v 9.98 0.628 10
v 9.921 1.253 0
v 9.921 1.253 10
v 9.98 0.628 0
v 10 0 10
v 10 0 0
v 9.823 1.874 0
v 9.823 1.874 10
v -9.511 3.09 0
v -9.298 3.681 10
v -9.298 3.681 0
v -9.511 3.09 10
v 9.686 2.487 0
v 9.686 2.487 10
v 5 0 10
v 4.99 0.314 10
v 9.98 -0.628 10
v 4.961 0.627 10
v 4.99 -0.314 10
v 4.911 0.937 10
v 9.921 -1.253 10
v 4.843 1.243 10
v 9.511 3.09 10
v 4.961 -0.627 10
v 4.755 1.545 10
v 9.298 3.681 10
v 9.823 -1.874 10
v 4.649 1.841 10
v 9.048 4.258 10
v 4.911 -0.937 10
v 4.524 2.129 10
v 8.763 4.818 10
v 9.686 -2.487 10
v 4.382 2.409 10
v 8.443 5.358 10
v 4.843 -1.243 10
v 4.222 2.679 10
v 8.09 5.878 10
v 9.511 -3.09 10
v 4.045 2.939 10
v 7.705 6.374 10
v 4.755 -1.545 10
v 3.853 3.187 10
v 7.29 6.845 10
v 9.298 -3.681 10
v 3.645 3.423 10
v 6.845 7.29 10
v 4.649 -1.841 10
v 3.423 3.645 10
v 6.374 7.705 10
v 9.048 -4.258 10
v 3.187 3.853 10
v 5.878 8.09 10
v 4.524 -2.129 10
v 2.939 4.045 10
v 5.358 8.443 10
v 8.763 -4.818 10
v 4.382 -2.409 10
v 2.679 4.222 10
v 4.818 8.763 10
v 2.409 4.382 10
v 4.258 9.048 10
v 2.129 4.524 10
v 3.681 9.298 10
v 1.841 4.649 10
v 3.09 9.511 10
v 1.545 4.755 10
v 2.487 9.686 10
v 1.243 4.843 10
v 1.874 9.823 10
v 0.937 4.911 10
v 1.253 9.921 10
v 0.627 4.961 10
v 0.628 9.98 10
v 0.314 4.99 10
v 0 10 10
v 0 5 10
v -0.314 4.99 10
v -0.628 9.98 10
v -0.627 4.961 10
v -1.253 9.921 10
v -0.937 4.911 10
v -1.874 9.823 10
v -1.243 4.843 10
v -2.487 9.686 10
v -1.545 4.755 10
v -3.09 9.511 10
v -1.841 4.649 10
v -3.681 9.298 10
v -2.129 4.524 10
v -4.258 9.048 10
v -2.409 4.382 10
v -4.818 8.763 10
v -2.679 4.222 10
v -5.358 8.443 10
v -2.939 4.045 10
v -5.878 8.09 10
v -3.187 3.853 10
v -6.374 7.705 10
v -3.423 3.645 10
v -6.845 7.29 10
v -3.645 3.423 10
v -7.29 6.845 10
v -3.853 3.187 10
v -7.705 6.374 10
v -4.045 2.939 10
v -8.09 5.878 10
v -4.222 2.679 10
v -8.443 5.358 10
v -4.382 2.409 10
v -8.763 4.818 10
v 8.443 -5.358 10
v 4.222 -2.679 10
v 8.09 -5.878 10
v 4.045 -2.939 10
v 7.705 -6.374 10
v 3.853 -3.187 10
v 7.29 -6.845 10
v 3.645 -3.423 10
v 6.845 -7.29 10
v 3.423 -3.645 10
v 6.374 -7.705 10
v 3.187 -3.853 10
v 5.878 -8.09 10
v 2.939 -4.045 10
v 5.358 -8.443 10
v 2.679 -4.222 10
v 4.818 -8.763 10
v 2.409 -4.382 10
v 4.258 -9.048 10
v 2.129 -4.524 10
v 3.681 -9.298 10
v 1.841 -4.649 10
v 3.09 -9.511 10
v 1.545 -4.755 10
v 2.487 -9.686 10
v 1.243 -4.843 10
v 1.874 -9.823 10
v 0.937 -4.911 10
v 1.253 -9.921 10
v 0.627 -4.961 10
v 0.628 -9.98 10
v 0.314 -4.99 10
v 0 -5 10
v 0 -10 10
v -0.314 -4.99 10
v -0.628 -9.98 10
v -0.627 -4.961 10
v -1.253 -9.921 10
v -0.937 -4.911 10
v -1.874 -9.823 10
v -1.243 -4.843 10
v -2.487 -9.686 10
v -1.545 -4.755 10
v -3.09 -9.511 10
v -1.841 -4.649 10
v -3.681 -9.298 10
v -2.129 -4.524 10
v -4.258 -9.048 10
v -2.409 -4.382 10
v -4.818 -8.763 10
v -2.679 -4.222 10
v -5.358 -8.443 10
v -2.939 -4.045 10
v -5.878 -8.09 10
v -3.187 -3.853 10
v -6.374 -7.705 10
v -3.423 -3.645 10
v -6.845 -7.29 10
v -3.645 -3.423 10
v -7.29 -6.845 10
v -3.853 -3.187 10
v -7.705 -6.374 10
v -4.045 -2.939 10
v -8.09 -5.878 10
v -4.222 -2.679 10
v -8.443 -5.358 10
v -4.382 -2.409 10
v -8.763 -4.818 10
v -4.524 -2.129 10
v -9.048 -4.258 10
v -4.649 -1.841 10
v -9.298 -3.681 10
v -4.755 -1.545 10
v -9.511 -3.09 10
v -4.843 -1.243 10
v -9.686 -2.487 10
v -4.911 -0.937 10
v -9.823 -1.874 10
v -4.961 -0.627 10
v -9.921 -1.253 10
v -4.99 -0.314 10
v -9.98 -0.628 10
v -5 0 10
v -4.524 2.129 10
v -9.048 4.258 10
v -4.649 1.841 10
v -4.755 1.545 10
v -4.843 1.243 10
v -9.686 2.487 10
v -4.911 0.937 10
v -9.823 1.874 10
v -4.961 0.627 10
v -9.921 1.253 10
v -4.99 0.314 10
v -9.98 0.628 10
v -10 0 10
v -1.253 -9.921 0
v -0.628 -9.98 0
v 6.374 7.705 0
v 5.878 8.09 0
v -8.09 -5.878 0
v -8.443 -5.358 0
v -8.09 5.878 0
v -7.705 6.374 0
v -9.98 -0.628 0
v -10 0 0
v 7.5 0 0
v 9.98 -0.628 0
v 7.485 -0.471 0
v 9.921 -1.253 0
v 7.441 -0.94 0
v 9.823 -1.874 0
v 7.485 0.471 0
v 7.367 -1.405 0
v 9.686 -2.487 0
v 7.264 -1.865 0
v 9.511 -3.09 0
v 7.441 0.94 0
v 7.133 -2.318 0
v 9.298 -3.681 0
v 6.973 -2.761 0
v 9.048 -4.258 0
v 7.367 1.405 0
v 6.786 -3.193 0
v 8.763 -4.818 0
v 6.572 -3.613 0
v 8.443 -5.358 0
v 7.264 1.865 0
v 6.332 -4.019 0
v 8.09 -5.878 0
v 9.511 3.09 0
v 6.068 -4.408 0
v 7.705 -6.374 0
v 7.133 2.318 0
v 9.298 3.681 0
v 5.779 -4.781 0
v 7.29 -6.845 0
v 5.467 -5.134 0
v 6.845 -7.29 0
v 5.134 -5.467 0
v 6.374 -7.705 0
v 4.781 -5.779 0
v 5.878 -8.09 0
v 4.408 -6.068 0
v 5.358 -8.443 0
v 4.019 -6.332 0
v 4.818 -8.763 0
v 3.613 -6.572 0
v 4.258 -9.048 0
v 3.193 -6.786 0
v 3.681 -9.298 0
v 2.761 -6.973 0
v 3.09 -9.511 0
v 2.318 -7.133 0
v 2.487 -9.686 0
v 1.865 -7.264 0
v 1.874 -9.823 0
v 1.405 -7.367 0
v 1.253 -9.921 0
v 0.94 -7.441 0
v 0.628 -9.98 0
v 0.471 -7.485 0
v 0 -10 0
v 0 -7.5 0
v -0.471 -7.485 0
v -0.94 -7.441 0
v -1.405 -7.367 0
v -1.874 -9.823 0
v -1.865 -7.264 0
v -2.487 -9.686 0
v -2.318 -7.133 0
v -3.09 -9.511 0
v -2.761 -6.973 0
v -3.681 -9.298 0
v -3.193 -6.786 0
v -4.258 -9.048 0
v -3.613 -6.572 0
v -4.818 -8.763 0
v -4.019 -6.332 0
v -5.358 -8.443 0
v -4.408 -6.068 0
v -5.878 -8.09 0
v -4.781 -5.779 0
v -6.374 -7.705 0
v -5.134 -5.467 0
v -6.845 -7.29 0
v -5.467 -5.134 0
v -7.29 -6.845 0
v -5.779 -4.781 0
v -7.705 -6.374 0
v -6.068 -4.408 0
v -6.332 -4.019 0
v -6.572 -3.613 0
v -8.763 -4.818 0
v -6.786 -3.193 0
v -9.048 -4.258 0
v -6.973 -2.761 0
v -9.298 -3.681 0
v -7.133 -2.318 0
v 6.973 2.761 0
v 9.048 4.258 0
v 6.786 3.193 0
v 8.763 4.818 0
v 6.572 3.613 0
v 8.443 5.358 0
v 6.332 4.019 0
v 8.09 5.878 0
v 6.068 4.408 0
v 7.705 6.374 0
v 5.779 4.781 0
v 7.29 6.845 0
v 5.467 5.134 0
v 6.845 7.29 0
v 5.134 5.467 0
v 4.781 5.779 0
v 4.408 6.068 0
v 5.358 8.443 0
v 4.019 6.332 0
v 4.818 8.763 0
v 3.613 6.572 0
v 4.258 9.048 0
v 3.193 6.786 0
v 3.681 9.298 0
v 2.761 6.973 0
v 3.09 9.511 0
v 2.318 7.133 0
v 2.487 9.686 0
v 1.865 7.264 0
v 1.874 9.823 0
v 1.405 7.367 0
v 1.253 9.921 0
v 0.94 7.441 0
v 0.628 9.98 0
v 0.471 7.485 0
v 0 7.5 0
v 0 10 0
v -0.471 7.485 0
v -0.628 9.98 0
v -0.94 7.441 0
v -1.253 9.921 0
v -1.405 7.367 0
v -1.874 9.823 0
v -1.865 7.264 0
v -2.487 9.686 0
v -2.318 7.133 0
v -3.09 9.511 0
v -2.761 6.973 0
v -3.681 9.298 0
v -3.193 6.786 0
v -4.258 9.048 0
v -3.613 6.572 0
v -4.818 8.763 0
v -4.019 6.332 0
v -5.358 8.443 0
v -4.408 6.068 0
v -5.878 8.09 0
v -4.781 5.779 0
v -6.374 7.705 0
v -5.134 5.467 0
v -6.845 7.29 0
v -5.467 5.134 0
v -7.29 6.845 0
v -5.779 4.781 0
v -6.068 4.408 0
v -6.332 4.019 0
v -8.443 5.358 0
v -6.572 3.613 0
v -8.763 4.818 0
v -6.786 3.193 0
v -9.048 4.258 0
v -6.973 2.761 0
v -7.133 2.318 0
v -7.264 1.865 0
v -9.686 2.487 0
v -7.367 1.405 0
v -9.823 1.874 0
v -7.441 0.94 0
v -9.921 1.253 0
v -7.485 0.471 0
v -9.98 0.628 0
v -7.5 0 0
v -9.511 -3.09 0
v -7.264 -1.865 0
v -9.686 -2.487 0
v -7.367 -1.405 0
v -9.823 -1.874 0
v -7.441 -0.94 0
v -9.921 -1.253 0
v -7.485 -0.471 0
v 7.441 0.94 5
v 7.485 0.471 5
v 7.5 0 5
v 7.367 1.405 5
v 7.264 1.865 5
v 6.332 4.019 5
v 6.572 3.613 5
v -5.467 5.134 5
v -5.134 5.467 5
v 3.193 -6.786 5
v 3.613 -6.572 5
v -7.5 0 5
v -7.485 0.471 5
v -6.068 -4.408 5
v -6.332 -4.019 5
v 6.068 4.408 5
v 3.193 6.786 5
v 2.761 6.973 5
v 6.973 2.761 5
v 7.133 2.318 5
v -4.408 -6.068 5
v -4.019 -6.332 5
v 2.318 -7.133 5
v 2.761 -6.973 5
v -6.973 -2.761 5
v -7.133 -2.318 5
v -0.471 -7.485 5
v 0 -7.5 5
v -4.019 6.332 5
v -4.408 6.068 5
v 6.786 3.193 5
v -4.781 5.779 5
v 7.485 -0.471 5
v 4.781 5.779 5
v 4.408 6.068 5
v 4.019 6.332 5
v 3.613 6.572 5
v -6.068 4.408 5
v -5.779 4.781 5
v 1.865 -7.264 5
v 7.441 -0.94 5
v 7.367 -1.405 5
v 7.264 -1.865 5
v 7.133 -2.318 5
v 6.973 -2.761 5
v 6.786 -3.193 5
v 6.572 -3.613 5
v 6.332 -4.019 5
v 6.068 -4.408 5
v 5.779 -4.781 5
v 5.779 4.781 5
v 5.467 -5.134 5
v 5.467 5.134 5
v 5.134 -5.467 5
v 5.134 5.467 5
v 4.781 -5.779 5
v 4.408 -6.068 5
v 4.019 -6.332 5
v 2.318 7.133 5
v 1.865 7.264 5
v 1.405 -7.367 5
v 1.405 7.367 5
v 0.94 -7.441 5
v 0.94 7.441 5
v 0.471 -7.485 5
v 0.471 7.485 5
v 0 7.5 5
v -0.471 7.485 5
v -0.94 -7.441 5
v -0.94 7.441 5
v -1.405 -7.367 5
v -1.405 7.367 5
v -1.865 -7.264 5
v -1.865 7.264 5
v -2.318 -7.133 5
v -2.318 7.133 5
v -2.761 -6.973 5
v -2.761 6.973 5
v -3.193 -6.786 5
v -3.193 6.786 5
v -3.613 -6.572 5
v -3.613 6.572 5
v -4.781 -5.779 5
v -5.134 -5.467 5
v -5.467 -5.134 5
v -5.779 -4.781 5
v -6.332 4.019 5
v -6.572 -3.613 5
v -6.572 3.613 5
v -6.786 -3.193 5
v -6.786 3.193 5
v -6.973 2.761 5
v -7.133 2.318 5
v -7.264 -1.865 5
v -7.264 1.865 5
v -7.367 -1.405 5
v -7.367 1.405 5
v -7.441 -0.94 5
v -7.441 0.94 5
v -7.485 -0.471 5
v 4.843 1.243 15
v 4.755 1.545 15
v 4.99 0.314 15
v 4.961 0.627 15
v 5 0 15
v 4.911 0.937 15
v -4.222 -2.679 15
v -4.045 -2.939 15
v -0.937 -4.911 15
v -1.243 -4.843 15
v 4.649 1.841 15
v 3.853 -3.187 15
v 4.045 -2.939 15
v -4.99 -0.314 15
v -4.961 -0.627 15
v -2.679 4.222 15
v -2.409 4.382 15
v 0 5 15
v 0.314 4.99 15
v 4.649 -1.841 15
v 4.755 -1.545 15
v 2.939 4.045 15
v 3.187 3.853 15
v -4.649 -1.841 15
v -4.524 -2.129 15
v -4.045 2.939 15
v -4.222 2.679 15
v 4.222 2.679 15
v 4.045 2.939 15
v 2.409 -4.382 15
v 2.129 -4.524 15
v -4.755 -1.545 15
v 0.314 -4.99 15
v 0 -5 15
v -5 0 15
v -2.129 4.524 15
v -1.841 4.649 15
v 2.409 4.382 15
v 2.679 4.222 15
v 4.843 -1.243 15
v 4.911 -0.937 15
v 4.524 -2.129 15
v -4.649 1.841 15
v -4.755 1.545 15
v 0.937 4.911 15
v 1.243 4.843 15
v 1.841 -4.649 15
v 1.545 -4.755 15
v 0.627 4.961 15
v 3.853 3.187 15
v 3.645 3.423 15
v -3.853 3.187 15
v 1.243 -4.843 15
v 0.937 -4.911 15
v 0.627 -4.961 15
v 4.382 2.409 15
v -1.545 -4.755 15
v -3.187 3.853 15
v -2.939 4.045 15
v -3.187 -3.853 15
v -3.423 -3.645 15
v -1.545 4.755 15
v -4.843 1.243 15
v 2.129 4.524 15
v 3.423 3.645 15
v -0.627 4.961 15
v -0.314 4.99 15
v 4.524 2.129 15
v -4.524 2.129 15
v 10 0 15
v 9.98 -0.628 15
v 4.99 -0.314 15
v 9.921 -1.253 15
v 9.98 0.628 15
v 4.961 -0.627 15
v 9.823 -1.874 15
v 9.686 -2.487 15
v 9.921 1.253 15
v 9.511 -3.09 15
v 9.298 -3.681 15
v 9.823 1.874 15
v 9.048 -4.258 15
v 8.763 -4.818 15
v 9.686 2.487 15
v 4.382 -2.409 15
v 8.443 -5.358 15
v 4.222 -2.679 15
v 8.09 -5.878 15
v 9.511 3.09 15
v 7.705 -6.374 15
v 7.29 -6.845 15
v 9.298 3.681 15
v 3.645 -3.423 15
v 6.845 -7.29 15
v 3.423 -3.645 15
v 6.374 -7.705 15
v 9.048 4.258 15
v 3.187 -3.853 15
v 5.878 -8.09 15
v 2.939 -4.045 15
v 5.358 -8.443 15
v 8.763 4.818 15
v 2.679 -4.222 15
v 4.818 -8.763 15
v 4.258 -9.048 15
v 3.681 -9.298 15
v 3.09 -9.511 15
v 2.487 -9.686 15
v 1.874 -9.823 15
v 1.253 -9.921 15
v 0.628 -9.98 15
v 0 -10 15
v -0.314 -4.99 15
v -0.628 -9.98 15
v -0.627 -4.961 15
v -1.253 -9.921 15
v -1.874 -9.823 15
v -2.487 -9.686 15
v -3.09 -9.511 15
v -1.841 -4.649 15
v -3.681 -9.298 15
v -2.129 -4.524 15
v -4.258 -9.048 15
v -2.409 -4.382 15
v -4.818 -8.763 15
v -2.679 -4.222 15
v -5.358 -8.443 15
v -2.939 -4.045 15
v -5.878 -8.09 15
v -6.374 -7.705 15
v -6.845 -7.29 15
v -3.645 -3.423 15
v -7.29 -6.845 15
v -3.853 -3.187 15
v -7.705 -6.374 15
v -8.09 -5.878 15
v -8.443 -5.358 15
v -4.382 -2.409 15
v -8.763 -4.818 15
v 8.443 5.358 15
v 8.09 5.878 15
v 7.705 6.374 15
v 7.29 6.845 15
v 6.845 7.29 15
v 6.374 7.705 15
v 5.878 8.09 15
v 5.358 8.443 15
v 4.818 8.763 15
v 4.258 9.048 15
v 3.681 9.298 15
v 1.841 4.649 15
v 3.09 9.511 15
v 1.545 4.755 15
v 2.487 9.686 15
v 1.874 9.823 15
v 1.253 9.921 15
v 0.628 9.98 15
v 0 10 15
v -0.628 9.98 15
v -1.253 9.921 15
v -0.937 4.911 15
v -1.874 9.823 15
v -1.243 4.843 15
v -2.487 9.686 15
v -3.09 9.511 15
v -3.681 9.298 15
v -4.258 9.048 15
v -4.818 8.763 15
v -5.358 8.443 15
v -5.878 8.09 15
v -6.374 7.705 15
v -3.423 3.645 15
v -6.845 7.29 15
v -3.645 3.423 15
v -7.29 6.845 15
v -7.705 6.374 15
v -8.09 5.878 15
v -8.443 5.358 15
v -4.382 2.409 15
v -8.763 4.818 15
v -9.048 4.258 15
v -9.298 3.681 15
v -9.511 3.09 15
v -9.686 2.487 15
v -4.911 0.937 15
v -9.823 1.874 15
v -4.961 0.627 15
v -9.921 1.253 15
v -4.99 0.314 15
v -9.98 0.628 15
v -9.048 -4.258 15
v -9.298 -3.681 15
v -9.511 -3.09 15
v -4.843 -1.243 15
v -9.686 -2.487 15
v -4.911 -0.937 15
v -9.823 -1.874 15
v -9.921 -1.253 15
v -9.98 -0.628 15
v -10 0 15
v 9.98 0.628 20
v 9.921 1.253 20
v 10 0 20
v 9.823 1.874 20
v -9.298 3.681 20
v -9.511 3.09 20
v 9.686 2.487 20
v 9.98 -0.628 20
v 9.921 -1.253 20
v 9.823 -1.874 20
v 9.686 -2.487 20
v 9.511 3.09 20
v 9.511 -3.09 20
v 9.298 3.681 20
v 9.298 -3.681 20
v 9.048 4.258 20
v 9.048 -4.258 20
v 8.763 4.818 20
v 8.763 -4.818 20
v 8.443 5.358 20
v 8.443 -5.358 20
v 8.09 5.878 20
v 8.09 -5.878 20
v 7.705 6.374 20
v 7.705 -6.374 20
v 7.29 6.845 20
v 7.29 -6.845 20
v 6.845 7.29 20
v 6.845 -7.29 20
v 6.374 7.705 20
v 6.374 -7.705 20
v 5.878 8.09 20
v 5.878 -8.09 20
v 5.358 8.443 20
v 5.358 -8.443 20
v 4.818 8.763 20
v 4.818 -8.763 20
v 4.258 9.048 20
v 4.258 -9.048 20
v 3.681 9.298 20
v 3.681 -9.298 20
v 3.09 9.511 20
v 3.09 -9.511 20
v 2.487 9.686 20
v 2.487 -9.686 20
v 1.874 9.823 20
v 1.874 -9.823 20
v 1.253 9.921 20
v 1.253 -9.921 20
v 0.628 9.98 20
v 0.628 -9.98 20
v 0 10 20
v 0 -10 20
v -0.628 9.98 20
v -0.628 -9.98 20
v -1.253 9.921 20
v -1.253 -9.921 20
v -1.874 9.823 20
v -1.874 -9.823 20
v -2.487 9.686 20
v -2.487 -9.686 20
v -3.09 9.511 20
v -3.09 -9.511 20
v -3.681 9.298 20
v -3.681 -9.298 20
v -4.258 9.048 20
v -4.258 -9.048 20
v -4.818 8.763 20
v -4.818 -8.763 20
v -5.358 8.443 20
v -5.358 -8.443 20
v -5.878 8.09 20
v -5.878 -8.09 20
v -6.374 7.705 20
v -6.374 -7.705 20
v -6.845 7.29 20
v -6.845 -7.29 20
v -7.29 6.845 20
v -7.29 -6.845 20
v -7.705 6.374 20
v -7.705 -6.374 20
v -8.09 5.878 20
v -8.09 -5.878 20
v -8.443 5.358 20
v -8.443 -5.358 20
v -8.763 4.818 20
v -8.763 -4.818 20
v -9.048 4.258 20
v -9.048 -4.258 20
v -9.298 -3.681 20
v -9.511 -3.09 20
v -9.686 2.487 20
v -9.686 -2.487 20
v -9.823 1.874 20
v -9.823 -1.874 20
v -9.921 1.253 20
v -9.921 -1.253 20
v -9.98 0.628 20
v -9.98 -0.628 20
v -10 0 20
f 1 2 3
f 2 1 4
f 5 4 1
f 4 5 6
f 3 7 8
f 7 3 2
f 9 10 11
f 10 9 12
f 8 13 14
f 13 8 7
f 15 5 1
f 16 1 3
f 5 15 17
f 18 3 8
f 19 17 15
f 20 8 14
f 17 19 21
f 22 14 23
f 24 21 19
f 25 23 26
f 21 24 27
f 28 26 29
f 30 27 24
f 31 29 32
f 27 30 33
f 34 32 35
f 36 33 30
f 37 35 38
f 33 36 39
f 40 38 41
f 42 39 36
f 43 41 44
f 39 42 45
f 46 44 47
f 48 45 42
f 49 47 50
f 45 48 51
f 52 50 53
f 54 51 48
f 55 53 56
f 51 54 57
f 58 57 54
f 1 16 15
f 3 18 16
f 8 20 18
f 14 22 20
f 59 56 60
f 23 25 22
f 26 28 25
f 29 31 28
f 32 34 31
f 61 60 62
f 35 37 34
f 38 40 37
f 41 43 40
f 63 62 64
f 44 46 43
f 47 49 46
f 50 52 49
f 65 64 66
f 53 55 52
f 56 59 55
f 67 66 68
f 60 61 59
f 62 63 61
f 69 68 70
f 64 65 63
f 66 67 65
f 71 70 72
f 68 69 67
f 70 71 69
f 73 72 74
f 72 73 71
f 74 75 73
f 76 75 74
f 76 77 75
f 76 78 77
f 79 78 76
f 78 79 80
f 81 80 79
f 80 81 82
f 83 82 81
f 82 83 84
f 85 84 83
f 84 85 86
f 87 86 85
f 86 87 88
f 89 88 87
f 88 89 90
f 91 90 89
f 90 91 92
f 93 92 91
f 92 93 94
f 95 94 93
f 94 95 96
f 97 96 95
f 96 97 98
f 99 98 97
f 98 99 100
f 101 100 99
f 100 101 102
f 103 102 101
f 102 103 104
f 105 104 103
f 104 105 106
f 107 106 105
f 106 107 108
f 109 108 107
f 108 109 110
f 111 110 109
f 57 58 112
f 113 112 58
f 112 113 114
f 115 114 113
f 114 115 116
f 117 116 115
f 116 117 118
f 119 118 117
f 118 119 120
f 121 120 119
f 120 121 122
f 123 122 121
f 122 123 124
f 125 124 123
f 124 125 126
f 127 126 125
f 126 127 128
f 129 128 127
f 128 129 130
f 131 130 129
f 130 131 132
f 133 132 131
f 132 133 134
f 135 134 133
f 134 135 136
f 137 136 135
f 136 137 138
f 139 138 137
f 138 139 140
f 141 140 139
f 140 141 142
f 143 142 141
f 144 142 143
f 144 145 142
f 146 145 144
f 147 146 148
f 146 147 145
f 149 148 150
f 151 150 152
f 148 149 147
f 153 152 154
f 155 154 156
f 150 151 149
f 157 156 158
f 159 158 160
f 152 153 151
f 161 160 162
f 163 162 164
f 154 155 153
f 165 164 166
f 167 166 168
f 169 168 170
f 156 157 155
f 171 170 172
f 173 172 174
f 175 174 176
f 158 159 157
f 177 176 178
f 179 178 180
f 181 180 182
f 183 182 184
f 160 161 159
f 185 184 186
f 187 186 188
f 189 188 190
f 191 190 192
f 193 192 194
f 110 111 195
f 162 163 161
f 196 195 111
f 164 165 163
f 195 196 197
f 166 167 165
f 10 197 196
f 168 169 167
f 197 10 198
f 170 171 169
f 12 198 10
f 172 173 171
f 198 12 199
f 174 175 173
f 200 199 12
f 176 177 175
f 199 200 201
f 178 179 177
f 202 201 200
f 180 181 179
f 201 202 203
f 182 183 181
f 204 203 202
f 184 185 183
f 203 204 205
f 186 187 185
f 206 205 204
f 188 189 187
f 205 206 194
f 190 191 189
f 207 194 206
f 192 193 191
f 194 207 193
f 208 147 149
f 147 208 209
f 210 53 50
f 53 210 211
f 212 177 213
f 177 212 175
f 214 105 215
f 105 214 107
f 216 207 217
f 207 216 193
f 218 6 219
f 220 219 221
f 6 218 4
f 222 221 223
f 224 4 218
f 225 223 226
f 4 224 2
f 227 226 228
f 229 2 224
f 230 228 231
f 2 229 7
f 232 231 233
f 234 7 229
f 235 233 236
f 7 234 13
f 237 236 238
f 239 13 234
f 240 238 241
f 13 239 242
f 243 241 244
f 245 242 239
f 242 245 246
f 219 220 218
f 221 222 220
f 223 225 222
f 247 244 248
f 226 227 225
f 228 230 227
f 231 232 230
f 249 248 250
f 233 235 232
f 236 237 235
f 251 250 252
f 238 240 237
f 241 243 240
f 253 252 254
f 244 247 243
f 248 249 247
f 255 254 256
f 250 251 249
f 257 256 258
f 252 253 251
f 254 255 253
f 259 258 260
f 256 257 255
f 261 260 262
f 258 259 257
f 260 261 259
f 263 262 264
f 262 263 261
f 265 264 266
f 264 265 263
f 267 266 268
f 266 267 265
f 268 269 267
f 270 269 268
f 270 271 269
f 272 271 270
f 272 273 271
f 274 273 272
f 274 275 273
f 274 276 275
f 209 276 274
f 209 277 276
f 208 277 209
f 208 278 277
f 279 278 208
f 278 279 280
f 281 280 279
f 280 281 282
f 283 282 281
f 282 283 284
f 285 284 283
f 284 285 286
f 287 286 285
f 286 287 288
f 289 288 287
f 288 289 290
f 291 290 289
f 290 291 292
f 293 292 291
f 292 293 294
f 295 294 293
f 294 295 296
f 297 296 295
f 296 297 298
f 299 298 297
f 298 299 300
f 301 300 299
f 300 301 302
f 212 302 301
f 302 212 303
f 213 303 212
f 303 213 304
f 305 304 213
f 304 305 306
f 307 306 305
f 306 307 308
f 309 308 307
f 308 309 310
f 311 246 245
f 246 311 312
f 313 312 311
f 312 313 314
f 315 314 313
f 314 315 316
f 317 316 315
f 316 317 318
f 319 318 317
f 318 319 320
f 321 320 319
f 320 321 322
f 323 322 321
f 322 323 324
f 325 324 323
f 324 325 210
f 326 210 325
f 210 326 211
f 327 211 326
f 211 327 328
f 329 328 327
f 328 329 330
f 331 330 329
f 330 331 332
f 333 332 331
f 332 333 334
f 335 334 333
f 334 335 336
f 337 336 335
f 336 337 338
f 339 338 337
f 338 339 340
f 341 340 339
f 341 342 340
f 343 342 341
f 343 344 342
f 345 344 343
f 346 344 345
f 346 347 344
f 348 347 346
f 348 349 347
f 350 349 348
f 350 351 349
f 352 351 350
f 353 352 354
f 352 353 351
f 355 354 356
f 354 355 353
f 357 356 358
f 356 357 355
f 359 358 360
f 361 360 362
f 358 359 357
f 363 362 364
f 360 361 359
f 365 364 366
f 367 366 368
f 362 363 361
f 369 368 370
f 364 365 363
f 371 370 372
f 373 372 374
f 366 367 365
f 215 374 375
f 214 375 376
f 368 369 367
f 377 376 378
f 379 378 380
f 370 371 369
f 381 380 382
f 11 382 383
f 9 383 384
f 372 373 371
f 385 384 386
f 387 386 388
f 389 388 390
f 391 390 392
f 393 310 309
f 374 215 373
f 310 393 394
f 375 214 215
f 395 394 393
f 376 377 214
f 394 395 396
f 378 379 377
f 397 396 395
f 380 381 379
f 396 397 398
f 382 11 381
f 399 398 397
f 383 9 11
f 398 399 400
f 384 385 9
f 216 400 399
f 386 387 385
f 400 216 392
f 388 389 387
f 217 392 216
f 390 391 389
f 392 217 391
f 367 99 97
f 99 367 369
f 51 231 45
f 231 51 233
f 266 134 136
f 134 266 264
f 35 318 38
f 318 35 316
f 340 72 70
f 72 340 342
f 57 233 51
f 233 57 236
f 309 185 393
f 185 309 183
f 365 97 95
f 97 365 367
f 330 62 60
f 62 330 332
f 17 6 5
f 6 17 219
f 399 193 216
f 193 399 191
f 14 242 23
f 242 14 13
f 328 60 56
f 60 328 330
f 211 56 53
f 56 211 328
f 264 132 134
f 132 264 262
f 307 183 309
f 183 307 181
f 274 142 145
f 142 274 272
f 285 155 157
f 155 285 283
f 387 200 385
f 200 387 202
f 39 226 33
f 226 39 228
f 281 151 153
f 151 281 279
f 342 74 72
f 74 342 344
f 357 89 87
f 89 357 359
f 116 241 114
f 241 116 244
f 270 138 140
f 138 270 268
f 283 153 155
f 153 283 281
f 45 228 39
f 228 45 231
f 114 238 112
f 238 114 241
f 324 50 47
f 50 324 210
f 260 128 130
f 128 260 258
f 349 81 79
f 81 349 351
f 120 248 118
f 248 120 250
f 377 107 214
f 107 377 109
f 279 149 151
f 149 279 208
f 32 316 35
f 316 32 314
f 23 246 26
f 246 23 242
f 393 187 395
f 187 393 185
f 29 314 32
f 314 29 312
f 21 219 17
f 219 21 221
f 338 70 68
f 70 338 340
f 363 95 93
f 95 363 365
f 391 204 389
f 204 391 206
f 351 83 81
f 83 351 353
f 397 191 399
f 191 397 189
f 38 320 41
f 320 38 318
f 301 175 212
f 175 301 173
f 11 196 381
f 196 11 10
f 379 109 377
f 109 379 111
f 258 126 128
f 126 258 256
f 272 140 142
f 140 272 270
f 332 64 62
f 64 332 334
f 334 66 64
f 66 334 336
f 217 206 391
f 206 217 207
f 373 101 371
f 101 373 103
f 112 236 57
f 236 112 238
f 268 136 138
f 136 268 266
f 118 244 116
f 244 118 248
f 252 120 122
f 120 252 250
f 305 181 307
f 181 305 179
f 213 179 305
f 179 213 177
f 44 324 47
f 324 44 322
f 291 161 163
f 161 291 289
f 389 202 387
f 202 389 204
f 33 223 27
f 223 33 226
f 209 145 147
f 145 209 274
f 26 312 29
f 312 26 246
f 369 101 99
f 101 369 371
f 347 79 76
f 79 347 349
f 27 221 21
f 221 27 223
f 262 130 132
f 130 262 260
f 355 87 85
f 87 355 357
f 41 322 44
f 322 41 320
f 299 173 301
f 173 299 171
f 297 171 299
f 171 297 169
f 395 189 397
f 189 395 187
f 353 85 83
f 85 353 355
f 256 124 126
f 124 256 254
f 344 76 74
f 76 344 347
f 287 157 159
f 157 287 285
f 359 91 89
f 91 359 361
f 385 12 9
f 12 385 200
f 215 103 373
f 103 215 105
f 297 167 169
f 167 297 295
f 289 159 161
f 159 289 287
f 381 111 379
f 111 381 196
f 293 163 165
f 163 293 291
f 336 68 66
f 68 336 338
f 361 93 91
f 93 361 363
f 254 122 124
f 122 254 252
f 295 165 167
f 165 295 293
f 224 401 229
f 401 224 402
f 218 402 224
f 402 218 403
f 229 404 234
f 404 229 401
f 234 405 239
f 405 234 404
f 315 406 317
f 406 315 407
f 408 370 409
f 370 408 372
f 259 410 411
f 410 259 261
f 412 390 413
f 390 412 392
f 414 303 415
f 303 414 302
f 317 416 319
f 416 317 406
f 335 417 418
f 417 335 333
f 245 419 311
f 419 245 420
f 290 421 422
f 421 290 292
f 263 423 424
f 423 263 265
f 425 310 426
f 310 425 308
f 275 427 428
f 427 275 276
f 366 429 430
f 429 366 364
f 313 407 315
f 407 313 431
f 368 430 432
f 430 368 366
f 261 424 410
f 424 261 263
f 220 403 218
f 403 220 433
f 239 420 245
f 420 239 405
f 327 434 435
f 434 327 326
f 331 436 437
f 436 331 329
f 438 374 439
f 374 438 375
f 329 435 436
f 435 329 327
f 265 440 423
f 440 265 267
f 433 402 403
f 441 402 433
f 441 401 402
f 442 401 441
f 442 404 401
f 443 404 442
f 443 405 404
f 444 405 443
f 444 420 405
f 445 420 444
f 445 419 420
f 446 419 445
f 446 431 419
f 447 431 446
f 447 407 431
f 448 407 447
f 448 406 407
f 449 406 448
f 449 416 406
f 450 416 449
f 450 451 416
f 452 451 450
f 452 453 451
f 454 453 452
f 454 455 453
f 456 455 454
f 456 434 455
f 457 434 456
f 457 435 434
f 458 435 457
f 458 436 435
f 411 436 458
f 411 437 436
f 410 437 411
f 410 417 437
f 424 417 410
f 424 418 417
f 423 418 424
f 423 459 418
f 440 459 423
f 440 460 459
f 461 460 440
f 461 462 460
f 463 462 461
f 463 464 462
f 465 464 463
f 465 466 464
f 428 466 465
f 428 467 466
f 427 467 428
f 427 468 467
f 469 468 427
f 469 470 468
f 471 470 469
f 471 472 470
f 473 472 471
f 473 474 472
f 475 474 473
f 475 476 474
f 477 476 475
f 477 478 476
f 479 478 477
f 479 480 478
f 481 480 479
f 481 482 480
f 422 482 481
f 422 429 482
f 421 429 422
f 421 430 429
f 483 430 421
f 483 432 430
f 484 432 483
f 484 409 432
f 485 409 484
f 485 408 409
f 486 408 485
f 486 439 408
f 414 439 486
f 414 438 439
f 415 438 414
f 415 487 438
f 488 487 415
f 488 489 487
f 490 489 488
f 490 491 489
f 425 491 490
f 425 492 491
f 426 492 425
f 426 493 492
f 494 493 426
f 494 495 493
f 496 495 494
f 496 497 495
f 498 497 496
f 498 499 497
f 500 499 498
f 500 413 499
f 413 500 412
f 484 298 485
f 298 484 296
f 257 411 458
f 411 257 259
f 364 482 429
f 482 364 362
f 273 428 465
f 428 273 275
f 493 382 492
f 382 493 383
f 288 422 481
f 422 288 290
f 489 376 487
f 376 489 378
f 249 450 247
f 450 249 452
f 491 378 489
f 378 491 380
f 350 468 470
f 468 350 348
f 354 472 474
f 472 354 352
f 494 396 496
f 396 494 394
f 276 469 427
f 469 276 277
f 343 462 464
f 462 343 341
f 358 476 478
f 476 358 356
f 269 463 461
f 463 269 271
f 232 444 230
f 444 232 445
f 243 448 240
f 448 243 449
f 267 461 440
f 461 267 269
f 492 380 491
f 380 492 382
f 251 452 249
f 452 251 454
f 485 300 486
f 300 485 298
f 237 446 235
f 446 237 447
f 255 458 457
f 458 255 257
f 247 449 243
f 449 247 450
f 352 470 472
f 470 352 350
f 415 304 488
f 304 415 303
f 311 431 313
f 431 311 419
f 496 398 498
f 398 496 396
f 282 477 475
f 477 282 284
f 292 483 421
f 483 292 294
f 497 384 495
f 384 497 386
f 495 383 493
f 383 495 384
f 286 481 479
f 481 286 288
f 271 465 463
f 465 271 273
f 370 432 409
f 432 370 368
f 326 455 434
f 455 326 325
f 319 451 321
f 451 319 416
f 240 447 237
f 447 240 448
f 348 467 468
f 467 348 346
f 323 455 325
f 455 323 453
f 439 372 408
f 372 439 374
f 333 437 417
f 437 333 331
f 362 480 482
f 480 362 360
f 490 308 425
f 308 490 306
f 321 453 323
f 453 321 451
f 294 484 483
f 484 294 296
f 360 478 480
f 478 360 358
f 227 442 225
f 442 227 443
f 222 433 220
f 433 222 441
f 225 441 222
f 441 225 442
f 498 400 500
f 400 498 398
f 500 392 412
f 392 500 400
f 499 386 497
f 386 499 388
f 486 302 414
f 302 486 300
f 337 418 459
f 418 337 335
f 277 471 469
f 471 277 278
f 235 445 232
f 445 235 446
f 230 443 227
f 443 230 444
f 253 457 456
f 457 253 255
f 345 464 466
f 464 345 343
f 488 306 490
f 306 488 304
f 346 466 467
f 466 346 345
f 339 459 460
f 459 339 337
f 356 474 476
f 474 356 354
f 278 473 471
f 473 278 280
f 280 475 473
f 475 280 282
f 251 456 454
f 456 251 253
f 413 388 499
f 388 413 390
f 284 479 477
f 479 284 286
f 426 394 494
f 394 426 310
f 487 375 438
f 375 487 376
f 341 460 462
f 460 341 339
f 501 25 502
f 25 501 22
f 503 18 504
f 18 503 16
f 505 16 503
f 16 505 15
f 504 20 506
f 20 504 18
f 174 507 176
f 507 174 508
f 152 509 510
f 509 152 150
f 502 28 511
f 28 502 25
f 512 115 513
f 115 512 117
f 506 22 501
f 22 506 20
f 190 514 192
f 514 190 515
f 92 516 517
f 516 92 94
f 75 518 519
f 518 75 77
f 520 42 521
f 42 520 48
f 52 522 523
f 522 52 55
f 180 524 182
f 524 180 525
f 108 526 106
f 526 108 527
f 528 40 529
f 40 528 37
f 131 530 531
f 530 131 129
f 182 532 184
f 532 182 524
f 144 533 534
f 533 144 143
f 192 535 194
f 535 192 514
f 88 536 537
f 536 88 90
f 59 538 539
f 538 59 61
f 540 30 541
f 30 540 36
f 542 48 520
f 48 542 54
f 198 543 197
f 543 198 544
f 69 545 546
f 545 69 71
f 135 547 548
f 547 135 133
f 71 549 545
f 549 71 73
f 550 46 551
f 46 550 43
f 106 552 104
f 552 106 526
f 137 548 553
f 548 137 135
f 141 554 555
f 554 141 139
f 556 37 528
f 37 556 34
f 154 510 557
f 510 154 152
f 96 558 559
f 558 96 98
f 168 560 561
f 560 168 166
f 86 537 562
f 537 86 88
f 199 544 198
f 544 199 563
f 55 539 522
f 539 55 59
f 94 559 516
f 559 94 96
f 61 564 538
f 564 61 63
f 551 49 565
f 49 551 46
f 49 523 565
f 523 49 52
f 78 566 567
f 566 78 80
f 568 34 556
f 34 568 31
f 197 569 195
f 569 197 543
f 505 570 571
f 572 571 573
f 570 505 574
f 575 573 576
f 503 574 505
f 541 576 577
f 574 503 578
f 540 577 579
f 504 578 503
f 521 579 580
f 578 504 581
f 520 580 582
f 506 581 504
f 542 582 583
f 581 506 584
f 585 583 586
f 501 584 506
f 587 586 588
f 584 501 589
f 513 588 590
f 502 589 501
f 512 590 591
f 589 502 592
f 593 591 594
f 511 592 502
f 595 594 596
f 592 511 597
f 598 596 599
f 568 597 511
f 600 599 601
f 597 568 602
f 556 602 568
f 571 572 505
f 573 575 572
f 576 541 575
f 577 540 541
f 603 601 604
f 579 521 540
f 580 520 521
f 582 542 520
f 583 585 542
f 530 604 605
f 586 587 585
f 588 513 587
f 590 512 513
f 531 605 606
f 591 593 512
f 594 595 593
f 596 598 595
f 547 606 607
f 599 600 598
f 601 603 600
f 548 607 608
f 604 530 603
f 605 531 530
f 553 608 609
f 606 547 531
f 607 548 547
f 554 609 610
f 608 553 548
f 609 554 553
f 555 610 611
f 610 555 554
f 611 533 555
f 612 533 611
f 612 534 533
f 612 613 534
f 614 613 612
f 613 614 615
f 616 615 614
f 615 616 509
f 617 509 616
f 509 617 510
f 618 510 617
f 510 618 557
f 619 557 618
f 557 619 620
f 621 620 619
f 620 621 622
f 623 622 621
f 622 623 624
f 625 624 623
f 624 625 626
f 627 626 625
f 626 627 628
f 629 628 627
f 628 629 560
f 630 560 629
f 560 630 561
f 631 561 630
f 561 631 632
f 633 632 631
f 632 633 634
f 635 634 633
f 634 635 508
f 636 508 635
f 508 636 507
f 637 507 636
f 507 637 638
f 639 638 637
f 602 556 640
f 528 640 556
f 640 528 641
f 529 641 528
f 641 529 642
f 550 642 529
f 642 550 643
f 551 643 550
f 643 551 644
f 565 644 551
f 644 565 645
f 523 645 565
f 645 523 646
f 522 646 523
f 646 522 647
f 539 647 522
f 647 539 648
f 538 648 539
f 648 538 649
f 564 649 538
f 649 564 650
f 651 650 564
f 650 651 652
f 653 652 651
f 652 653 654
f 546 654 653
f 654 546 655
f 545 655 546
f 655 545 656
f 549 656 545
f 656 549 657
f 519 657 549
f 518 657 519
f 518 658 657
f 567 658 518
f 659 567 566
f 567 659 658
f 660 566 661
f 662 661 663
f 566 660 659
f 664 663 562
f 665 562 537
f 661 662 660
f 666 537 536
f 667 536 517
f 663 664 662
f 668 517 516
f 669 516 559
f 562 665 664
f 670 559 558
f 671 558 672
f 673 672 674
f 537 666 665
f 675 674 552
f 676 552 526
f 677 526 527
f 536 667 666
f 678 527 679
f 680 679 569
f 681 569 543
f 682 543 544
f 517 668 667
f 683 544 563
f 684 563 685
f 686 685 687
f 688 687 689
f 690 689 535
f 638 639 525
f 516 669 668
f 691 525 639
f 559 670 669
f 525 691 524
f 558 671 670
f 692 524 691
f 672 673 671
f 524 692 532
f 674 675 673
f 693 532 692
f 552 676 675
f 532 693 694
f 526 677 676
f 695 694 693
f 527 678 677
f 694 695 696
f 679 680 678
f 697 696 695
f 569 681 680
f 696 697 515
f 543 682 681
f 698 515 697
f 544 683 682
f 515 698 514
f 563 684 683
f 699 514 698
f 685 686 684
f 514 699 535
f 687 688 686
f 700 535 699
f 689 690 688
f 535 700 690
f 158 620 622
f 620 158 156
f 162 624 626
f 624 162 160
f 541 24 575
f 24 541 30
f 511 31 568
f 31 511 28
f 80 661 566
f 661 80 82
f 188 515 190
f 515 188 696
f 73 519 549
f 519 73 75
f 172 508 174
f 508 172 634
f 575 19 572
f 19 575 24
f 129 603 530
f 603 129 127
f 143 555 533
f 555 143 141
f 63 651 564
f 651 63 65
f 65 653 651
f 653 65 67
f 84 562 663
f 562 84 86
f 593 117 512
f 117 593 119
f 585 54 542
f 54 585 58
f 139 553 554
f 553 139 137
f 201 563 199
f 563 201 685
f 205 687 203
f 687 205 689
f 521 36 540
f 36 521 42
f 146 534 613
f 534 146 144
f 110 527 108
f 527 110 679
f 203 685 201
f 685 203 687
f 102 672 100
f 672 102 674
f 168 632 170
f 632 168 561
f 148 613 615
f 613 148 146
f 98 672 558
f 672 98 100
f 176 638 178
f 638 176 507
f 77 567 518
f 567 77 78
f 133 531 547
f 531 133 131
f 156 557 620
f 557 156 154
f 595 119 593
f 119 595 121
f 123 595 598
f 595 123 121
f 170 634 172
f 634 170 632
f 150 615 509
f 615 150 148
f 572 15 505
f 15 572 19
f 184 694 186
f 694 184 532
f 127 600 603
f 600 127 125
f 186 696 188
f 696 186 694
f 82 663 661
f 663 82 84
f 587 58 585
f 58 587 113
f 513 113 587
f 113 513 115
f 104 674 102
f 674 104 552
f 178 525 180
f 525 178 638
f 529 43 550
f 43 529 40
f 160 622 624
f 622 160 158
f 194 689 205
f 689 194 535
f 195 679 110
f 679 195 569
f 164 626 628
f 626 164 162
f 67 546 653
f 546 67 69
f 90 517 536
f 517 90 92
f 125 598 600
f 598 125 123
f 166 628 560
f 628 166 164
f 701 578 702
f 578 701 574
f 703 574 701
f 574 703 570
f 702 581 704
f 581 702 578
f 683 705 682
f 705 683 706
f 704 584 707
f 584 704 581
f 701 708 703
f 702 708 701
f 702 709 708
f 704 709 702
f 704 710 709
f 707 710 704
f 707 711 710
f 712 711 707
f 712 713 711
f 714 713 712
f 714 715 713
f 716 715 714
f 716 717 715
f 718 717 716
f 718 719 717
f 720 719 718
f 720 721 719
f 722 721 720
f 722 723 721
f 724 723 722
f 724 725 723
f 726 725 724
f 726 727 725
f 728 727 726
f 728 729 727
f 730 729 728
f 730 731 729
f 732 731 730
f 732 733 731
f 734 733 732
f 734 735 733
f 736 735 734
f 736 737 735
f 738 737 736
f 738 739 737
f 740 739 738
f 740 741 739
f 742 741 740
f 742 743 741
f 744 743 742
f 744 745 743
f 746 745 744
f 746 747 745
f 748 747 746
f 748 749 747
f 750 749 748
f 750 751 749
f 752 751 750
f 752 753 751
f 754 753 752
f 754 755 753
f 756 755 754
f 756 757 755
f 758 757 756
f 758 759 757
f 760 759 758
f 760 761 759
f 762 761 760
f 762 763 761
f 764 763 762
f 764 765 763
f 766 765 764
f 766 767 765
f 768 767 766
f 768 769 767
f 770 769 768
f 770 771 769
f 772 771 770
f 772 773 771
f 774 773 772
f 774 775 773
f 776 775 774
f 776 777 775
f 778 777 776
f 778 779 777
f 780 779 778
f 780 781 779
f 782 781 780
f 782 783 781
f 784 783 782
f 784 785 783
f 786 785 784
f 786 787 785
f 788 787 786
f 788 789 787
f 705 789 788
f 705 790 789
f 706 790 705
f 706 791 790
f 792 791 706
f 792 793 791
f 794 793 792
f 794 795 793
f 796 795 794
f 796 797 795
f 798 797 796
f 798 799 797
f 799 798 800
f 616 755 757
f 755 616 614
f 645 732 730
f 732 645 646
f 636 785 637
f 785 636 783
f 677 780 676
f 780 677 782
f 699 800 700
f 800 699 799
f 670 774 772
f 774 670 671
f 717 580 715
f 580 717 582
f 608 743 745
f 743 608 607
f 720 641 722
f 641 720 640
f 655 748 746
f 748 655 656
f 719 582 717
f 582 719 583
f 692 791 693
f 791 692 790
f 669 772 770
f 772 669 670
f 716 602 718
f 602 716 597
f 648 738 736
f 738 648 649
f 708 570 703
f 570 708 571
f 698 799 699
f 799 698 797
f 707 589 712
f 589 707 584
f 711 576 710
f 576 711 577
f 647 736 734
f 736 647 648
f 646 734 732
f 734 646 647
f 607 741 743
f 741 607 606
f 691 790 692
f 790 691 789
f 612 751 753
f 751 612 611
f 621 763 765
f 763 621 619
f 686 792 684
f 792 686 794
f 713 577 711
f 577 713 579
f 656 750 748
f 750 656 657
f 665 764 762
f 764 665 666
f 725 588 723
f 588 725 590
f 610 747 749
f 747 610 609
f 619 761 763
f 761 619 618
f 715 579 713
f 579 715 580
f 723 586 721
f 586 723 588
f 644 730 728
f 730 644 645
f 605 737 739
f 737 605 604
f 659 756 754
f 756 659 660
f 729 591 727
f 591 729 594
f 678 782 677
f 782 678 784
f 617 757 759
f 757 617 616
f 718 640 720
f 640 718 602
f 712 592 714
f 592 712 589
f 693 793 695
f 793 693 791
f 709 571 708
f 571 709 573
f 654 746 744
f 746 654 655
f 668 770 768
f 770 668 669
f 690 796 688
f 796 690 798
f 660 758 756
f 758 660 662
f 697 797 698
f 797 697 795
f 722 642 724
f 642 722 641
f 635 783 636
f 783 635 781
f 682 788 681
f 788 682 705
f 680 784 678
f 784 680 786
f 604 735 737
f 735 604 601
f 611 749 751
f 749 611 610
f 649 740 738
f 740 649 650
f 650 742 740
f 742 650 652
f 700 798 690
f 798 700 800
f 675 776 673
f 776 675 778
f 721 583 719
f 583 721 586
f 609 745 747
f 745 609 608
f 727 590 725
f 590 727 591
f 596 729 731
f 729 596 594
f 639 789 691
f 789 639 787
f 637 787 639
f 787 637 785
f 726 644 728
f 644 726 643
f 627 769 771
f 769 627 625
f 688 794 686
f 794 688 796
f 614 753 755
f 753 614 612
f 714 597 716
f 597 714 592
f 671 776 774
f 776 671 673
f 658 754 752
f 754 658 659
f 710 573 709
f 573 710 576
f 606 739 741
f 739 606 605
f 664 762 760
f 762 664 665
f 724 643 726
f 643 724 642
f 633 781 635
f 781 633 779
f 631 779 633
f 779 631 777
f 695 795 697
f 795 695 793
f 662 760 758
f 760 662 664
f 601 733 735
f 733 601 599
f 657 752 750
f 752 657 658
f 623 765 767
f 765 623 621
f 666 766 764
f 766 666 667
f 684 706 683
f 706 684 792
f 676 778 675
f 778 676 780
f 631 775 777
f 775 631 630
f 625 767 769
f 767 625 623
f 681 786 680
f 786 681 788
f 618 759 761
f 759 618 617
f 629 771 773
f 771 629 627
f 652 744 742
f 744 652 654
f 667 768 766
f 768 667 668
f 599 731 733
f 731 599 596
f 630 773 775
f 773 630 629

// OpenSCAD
union() {
   $fn = 100;
   difference() {
      $fn = 100;
      cylinder(d=20,h=10);
      cylinder(d=15,h=5);
   }
   translate([0,0,10]) cylinder(d=10,h=5);
   translate([0,0,15]) cylinder(d=20,h=5);
}
